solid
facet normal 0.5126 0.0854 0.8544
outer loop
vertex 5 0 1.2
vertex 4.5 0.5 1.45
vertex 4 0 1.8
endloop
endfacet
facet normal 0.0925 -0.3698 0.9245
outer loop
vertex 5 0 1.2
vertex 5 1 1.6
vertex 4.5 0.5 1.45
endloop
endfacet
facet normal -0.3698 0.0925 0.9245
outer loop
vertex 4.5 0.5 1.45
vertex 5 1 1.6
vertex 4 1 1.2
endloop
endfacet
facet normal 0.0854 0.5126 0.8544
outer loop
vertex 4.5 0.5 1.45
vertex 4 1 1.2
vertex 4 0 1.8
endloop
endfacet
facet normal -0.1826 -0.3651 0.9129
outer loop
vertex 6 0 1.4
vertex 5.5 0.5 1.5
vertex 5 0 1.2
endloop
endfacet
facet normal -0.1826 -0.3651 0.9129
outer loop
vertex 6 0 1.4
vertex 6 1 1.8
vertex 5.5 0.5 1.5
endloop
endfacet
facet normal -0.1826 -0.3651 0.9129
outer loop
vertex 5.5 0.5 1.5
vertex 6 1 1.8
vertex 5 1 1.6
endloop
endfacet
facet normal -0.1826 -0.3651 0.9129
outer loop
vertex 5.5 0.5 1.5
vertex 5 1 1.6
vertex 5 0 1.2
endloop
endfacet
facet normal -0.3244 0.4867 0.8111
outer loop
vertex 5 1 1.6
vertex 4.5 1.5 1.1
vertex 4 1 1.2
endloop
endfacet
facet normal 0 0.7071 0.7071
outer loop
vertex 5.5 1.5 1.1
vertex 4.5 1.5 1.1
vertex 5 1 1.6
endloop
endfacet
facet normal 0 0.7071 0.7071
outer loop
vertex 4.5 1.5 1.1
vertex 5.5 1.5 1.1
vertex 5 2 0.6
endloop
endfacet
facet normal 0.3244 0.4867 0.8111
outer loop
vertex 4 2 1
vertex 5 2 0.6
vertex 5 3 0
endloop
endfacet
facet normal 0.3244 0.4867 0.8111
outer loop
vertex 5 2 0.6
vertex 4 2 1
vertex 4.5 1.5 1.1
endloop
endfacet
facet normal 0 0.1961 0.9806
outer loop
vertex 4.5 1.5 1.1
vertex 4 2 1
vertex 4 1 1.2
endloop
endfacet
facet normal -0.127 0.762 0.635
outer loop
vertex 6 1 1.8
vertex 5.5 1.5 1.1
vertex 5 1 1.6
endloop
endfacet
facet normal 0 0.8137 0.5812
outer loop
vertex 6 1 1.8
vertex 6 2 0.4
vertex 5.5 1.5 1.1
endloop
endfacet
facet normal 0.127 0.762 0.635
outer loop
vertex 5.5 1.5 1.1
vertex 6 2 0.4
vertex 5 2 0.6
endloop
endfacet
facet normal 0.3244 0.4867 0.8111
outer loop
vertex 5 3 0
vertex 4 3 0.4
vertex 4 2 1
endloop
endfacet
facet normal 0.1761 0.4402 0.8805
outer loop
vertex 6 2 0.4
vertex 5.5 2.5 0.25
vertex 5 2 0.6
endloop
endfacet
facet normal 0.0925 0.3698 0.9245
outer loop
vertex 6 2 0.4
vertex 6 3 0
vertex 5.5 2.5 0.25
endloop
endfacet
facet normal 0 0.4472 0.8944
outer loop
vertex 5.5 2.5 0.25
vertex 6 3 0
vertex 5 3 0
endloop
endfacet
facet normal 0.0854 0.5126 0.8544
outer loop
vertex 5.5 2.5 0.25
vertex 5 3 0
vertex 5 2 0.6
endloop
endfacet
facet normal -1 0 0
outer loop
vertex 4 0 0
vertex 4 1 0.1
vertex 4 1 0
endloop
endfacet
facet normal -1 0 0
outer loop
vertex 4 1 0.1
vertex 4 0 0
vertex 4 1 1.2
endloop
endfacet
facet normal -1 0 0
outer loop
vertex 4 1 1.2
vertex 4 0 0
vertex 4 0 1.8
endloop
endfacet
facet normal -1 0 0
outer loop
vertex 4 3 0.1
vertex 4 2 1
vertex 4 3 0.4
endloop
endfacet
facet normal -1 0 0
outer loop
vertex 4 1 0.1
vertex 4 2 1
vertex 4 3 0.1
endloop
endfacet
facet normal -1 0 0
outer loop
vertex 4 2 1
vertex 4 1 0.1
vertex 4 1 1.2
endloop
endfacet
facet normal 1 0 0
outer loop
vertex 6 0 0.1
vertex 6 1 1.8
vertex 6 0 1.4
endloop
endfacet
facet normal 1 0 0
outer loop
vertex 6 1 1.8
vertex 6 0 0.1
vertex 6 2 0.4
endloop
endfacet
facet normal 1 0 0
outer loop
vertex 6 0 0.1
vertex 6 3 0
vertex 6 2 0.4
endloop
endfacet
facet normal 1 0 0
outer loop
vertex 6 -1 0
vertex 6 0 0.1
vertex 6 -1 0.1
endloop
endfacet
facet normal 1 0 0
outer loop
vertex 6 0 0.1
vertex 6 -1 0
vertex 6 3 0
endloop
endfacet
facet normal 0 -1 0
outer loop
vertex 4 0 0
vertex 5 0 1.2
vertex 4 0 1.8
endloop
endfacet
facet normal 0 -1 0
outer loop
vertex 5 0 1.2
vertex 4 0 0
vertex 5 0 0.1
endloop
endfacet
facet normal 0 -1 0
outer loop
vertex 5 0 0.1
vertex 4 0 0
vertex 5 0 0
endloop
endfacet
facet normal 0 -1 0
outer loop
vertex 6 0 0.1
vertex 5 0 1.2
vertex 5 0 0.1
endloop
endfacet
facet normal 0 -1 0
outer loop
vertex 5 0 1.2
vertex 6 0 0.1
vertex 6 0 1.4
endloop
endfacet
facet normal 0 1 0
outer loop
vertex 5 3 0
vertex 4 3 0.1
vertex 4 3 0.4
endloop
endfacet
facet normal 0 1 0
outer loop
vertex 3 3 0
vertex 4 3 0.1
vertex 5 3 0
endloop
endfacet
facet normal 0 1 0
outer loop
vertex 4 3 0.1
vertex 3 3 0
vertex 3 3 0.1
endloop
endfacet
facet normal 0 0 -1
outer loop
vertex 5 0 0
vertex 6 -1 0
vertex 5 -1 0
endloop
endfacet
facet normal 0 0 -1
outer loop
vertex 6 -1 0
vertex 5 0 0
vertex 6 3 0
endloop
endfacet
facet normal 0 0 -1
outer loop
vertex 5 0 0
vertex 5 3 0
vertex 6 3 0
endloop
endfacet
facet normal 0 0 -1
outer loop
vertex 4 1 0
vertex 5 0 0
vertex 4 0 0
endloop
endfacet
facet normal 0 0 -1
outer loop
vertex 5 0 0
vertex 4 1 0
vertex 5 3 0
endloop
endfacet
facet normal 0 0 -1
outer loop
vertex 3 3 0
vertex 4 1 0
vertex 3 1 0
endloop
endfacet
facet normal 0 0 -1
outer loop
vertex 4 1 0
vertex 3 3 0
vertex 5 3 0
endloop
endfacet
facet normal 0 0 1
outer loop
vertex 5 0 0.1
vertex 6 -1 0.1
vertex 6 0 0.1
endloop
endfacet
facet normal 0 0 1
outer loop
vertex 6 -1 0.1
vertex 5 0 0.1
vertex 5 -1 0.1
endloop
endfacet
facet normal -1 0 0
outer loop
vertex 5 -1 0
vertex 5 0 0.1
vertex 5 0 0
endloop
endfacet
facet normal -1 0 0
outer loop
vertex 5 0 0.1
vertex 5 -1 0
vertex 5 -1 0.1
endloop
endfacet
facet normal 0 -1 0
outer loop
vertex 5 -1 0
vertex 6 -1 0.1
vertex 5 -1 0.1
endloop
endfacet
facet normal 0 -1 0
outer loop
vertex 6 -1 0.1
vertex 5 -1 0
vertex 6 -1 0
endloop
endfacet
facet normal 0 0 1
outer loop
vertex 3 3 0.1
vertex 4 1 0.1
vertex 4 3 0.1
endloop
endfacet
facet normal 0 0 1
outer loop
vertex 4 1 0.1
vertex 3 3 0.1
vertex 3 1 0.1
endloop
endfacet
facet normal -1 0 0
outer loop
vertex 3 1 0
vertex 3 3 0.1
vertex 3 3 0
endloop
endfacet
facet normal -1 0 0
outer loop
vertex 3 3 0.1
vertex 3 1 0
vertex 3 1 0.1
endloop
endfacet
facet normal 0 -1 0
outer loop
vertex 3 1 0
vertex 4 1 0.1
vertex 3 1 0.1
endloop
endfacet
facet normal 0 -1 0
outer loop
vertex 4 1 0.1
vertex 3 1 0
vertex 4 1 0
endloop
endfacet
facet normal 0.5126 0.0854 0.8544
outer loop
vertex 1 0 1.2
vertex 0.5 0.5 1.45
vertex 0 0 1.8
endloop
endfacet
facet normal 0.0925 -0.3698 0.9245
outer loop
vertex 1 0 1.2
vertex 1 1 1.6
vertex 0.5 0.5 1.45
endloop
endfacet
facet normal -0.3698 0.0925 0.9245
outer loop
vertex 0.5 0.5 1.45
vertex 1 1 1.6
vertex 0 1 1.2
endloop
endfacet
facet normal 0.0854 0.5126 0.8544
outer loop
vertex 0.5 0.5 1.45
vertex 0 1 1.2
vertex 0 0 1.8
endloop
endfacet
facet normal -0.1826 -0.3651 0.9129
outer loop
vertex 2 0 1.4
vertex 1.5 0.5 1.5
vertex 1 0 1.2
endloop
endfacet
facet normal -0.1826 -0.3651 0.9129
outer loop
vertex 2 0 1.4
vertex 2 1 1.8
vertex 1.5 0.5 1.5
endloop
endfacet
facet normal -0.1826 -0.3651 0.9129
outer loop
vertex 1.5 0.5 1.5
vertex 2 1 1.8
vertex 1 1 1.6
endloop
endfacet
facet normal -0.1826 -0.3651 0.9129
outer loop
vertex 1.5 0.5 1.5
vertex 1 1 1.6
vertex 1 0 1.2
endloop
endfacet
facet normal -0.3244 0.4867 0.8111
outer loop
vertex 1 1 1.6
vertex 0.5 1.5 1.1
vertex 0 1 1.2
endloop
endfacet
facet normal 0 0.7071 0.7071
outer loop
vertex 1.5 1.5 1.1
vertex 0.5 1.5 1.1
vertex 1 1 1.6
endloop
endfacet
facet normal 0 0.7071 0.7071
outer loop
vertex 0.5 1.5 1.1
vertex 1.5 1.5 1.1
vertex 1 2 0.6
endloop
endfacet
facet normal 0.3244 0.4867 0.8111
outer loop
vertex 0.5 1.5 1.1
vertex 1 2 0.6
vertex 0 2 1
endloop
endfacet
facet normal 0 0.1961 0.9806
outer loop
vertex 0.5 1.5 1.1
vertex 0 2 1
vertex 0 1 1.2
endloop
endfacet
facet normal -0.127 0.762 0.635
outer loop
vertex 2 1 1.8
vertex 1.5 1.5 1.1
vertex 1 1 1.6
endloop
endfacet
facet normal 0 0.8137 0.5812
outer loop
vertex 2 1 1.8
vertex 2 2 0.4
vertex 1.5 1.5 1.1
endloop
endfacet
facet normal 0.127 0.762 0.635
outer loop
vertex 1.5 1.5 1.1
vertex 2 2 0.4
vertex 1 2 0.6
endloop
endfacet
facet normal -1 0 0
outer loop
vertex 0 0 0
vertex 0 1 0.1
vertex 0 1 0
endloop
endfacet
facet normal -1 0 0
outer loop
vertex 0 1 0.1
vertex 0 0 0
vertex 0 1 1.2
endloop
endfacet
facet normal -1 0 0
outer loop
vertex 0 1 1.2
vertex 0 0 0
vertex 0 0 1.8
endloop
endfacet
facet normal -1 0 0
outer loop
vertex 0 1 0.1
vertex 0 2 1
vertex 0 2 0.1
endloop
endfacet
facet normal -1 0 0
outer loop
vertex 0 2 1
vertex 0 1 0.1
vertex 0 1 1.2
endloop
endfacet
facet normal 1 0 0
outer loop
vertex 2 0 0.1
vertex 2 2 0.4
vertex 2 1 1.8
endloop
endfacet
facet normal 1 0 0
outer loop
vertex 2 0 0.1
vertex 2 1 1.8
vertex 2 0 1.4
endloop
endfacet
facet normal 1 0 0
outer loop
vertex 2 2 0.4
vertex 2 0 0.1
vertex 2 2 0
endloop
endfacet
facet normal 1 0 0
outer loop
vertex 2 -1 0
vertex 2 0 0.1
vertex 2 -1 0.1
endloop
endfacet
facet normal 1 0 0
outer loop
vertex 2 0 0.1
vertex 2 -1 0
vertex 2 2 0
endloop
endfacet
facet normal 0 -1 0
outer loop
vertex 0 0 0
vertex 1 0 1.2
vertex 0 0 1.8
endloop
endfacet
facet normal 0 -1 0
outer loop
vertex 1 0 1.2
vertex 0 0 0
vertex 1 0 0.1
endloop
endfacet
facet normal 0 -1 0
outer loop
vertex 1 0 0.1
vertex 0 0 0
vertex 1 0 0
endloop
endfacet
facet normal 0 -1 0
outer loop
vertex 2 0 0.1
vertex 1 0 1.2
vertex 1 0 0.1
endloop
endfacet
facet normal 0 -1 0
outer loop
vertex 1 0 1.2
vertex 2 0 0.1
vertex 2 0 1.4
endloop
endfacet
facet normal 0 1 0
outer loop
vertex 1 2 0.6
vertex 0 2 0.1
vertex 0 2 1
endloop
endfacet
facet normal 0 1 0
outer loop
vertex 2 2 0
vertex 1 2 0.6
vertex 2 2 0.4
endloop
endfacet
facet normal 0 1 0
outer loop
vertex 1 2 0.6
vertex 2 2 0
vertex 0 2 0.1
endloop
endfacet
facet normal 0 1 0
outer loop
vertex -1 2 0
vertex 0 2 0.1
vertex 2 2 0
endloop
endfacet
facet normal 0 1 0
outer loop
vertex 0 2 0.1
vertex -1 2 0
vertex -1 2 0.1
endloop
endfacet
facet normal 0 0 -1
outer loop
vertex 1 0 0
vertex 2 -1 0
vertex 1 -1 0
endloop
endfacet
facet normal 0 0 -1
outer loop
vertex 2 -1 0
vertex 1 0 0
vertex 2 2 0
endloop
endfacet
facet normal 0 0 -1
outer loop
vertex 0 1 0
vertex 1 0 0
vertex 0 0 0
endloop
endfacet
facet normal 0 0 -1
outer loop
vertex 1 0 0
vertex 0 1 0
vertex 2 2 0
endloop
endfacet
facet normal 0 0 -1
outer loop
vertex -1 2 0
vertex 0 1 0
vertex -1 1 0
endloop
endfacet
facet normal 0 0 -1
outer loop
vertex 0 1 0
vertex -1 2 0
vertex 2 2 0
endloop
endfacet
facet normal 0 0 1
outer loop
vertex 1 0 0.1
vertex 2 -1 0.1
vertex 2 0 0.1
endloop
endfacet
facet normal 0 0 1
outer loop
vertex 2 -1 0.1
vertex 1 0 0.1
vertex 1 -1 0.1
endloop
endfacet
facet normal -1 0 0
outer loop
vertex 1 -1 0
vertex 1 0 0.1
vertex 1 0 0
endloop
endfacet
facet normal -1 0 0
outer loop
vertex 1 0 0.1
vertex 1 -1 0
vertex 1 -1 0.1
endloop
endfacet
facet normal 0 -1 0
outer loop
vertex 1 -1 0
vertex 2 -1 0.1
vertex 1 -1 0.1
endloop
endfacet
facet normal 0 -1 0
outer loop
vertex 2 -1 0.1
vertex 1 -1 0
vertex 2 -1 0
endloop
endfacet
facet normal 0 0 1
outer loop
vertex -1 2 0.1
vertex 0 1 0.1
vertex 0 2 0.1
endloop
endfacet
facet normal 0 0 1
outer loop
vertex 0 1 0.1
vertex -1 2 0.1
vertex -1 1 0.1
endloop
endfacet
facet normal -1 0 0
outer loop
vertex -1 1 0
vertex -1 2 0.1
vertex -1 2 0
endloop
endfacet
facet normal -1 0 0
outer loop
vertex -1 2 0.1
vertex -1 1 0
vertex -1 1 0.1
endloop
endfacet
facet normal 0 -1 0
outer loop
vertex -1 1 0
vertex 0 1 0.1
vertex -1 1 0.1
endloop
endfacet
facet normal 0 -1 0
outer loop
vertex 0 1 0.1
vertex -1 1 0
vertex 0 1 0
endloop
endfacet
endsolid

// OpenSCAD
// .dat file has values from 2-9
scale([1,1,0.2]) surface("issue1223.dat");
translate([1,-1,0]) cube([1,1,0.1]);
translate([-1,1,0]) cube([1,1,0.1]);

// .dat file has incomplete last line
translate([4,0,0]) {
    scale([1,1,0.2]) surface("issue1223-2.dat");
    translate([1,-1,0]) cube([1,1,0.1]);
    translate([-1,1,0]) cube([1,2,0.1]);
}
